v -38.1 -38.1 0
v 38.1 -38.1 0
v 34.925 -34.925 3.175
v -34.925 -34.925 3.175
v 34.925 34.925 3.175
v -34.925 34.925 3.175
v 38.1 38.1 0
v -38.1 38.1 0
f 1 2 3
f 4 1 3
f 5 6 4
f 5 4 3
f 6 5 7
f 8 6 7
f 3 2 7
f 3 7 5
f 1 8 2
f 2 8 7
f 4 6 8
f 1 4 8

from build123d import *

# Parameters (mm, degrees)
F0_W     = 76.2
F0_H     = 76.2
F1_DEPTH = 3.175
F4_DEPTH = 76.2
F5_DEPTH = 76.2


with BuildPart() as f1:
    # F0 (on Top) → F1 (new body)
    with BuildSketch(Plane.XY):
        Rectangle(F0_W, F0_H)
    extrude(amount=F1_DEPTH)

    # F3 (on face) → F4 (cut)
    with BuildSketch(Plane(origin=(0, 38.1, 0), x_dir=(-1, 0, 0), z_dir=(0, 1, 0))):
        Polygon((-38.1, 3.175), (-38.1, 0), (-34.925, 3.175), align=None)
        Polygon((34.925, 3.175), (38.1, 0), (38.1, 3.175), align=None)
    extrude(amount=-F4_DEPTH, mode=Mode.SUBTRACT)

    # F2 (on face) → F5 (cut)
    with BuildSketch(Plane.YZ.offset(38.1)):
        Polygon((34.925, 3.175), (38.1, 0), (38.1, 3.175), align=None)
        Polygon((-38.1, 3.175), (-38.1, 0), (-34.925, 3.175), align=None)
    extrude(amount=-F5_DEPTH, mode=Mode.SUBTRACT)


solid = f1.part
